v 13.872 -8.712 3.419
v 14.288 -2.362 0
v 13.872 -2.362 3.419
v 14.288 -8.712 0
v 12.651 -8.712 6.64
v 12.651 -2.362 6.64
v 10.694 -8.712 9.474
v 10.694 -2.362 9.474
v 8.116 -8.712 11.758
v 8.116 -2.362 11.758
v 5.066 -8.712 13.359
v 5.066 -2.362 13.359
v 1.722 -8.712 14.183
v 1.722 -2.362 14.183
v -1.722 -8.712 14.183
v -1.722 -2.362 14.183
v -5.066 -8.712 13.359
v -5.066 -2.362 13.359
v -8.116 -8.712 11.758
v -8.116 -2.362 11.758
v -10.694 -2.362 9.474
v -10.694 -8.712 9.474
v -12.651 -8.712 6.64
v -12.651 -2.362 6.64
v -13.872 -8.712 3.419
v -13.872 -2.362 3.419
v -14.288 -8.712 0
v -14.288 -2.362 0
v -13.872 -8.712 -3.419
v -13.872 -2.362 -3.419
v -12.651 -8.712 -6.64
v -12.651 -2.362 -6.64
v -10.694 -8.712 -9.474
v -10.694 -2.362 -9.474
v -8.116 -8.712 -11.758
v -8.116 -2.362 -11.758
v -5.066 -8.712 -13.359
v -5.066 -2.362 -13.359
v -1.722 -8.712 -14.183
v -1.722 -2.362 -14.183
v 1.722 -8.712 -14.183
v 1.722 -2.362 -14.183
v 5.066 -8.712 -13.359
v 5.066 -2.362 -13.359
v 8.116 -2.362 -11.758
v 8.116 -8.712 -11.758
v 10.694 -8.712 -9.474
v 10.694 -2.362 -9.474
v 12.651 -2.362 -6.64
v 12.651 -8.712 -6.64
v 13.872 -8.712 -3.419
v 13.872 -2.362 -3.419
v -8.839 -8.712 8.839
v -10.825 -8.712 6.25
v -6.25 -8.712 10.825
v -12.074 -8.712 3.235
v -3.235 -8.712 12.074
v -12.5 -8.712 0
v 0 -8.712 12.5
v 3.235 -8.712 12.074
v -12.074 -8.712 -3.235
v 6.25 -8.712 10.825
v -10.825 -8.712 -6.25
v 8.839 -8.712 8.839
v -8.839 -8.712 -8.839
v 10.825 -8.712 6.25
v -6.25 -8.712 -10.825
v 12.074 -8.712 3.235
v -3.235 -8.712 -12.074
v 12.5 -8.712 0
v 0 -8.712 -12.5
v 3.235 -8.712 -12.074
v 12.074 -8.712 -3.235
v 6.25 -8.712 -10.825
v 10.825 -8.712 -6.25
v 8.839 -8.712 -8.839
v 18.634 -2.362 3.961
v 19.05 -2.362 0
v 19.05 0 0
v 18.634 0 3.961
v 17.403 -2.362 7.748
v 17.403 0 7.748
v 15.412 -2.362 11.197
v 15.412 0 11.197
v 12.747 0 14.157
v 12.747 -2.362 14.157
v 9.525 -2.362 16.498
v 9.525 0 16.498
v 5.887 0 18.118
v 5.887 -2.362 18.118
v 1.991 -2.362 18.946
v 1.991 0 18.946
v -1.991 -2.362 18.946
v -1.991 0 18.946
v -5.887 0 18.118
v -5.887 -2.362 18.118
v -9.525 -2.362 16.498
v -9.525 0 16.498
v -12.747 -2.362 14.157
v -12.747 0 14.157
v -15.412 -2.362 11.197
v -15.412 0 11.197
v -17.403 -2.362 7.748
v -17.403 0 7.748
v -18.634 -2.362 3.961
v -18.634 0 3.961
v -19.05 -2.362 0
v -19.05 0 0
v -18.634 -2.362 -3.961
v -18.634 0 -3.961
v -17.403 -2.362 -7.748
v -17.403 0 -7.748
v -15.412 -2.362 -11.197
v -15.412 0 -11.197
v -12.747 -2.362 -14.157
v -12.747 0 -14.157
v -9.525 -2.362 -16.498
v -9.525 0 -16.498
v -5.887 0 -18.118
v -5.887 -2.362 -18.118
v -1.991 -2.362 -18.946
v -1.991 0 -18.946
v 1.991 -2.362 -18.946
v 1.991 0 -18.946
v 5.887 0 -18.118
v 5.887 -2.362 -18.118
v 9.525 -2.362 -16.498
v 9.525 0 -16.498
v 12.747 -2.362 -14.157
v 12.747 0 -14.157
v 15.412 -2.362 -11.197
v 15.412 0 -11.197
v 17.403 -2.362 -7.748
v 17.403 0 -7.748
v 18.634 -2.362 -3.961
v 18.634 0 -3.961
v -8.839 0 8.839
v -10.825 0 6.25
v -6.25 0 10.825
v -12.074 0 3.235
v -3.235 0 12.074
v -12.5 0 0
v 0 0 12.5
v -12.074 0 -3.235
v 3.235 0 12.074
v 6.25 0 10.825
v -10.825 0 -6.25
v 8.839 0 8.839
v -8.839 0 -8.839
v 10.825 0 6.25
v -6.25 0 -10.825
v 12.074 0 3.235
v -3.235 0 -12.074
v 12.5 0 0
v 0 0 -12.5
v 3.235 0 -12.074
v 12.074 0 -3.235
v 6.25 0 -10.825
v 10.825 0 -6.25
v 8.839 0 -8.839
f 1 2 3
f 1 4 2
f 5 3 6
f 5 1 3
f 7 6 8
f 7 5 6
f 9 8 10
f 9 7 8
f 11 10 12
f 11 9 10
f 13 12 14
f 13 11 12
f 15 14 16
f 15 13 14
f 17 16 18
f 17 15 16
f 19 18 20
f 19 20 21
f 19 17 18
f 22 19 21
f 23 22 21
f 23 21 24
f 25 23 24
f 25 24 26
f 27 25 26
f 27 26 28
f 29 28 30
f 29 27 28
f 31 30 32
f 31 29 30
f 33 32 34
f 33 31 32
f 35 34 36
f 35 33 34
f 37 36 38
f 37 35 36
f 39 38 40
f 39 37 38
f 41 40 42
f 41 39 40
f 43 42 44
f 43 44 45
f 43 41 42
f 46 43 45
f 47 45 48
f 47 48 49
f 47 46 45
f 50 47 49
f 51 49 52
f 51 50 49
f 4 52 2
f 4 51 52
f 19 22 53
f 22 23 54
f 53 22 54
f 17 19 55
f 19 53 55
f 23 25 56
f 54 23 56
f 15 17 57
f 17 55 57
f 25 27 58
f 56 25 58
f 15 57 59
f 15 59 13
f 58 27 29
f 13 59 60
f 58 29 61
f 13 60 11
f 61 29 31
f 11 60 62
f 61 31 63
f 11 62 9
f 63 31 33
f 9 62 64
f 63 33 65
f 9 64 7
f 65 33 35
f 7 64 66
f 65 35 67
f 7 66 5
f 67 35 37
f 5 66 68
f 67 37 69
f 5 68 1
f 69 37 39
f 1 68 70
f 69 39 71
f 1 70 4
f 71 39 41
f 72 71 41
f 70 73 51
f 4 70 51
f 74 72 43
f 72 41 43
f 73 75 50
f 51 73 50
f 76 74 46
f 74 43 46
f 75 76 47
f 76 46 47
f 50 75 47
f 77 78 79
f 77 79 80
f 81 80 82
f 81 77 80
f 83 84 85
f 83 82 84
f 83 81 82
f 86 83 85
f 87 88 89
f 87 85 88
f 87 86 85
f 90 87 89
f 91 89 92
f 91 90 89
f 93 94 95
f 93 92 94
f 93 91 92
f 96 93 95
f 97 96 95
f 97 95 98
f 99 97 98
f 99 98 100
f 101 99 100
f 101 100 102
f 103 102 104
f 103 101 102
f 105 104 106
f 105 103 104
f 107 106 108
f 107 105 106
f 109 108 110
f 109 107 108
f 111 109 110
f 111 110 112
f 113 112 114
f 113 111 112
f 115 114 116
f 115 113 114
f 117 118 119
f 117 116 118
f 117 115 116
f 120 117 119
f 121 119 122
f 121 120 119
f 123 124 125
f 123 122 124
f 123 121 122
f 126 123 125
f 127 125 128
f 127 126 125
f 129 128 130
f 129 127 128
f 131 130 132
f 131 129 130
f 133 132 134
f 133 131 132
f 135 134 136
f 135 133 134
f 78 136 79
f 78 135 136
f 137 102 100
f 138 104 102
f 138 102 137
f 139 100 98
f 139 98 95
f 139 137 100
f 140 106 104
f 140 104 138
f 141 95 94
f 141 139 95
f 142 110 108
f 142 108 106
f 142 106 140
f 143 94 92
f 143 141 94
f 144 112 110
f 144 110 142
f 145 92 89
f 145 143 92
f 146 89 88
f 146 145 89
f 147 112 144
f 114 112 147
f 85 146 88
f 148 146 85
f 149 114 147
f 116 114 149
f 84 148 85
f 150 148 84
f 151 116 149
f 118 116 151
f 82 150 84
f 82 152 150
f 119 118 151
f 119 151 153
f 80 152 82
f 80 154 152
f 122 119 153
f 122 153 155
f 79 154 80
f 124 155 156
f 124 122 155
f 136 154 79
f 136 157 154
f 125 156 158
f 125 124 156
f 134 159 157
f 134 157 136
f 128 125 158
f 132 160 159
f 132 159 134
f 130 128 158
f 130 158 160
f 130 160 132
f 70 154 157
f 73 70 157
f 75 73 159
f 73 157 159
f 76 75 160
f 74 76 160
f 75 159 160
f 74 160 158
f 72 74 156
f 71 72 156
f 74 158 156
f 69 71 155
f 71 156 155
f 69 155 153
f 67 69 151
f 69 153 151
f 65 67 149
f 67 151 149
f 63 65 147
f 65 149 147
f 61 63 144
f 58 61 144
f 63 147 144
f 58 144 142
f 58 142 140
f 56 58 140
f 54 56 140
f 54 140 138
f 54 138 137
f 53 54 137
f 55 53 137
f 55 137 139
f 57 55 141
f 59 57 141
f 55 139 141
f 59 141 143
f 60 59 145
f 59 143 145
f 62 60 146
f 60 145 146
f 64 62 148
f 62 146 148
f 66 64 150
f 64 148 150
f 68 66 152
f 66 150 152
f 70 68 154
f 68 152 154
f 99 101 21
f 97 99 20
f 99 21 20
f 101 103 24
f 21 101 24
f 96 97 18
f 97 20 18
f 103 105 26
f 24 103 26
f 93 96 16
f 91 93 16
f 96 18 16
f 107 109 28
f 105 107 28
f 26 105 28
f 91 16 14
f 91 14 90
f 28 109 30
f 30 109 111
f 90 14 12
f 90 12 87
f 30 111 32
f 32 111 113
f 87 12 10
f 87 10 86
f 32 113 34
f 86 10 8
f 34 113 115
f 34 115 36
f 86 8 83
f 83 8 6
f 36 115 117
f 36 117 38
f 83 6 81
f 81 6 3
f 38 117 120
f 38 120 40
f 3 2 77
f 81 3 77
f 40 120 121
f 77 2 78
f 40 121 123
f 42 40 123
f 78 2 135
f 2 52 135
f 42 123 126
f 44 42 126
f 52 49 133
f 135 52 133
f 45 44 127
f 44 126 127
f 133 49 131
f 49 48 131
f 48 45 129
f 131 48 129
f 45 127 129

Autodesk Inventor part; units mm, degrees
ref_plane "YZ Plane" through (0, 0, 0) normal (1, 0, 0) x (0, 1, 0)
ref_plane "XZ Plane" through (0, 0, 0) normal (0, 1, 0) x (-1, 0, 0)
ref_plane "XY Plane" through (0, 0, 0) normal (0, 0, 1) x (1, 0, 0)
sketch "Sketch1" plane through (0, 0, 0) normal (0, 0, 1) x (1, 0, 0)
  line L0 (0, 0) -> (19.05, 0)
  line L1 (19.05, 0) -> (19.05, -2.3622)
  line L2 (19.05, -2.3622) -> (14.8082, -2.3622)
  line L3 (14.8082, -2.3622) -> (14.8082, -8.7122)
  line L4 (14.8082, -8.7122) -> (0, -8.7122)
  line L5 (0, -8.7122) -> (0, 0)
  dimension "d2" = 19.05
  dimension "d3" = 2.3622
  dimension "d4" = 4.2418
  dimension "d5" = 6.35
revolve "Revolution1" add sketch "Sketch1" angle 360 about axis through (0, -8.7122, 0) along (0, 1, 0)
sketch "Sketch2" plane through (0, 0, 0) normal (0, 1, 0) x (1, 0, 0)
  circle A0 centre (0, 0) radius 12.5
  dimension "d7" = 25
extrude "Extrusion1" cut sketch "Sketch2" against normal blind 25.4
sketch "Sketch3" plane through (0, -8.7122, 0) normal (0, -1, 0) x (1, 0, 0)
  circle A0 centre (0, 0) radius 14.2875
  circle A1 centre (0, 0) radius 14.8082
  dimension "d10" = 28.575
extrude "Extrusion2" cut sketch "Sketch3" against normal blind 6.35
properties part number "BevelWheelSpace" material "ABS Plastic"
